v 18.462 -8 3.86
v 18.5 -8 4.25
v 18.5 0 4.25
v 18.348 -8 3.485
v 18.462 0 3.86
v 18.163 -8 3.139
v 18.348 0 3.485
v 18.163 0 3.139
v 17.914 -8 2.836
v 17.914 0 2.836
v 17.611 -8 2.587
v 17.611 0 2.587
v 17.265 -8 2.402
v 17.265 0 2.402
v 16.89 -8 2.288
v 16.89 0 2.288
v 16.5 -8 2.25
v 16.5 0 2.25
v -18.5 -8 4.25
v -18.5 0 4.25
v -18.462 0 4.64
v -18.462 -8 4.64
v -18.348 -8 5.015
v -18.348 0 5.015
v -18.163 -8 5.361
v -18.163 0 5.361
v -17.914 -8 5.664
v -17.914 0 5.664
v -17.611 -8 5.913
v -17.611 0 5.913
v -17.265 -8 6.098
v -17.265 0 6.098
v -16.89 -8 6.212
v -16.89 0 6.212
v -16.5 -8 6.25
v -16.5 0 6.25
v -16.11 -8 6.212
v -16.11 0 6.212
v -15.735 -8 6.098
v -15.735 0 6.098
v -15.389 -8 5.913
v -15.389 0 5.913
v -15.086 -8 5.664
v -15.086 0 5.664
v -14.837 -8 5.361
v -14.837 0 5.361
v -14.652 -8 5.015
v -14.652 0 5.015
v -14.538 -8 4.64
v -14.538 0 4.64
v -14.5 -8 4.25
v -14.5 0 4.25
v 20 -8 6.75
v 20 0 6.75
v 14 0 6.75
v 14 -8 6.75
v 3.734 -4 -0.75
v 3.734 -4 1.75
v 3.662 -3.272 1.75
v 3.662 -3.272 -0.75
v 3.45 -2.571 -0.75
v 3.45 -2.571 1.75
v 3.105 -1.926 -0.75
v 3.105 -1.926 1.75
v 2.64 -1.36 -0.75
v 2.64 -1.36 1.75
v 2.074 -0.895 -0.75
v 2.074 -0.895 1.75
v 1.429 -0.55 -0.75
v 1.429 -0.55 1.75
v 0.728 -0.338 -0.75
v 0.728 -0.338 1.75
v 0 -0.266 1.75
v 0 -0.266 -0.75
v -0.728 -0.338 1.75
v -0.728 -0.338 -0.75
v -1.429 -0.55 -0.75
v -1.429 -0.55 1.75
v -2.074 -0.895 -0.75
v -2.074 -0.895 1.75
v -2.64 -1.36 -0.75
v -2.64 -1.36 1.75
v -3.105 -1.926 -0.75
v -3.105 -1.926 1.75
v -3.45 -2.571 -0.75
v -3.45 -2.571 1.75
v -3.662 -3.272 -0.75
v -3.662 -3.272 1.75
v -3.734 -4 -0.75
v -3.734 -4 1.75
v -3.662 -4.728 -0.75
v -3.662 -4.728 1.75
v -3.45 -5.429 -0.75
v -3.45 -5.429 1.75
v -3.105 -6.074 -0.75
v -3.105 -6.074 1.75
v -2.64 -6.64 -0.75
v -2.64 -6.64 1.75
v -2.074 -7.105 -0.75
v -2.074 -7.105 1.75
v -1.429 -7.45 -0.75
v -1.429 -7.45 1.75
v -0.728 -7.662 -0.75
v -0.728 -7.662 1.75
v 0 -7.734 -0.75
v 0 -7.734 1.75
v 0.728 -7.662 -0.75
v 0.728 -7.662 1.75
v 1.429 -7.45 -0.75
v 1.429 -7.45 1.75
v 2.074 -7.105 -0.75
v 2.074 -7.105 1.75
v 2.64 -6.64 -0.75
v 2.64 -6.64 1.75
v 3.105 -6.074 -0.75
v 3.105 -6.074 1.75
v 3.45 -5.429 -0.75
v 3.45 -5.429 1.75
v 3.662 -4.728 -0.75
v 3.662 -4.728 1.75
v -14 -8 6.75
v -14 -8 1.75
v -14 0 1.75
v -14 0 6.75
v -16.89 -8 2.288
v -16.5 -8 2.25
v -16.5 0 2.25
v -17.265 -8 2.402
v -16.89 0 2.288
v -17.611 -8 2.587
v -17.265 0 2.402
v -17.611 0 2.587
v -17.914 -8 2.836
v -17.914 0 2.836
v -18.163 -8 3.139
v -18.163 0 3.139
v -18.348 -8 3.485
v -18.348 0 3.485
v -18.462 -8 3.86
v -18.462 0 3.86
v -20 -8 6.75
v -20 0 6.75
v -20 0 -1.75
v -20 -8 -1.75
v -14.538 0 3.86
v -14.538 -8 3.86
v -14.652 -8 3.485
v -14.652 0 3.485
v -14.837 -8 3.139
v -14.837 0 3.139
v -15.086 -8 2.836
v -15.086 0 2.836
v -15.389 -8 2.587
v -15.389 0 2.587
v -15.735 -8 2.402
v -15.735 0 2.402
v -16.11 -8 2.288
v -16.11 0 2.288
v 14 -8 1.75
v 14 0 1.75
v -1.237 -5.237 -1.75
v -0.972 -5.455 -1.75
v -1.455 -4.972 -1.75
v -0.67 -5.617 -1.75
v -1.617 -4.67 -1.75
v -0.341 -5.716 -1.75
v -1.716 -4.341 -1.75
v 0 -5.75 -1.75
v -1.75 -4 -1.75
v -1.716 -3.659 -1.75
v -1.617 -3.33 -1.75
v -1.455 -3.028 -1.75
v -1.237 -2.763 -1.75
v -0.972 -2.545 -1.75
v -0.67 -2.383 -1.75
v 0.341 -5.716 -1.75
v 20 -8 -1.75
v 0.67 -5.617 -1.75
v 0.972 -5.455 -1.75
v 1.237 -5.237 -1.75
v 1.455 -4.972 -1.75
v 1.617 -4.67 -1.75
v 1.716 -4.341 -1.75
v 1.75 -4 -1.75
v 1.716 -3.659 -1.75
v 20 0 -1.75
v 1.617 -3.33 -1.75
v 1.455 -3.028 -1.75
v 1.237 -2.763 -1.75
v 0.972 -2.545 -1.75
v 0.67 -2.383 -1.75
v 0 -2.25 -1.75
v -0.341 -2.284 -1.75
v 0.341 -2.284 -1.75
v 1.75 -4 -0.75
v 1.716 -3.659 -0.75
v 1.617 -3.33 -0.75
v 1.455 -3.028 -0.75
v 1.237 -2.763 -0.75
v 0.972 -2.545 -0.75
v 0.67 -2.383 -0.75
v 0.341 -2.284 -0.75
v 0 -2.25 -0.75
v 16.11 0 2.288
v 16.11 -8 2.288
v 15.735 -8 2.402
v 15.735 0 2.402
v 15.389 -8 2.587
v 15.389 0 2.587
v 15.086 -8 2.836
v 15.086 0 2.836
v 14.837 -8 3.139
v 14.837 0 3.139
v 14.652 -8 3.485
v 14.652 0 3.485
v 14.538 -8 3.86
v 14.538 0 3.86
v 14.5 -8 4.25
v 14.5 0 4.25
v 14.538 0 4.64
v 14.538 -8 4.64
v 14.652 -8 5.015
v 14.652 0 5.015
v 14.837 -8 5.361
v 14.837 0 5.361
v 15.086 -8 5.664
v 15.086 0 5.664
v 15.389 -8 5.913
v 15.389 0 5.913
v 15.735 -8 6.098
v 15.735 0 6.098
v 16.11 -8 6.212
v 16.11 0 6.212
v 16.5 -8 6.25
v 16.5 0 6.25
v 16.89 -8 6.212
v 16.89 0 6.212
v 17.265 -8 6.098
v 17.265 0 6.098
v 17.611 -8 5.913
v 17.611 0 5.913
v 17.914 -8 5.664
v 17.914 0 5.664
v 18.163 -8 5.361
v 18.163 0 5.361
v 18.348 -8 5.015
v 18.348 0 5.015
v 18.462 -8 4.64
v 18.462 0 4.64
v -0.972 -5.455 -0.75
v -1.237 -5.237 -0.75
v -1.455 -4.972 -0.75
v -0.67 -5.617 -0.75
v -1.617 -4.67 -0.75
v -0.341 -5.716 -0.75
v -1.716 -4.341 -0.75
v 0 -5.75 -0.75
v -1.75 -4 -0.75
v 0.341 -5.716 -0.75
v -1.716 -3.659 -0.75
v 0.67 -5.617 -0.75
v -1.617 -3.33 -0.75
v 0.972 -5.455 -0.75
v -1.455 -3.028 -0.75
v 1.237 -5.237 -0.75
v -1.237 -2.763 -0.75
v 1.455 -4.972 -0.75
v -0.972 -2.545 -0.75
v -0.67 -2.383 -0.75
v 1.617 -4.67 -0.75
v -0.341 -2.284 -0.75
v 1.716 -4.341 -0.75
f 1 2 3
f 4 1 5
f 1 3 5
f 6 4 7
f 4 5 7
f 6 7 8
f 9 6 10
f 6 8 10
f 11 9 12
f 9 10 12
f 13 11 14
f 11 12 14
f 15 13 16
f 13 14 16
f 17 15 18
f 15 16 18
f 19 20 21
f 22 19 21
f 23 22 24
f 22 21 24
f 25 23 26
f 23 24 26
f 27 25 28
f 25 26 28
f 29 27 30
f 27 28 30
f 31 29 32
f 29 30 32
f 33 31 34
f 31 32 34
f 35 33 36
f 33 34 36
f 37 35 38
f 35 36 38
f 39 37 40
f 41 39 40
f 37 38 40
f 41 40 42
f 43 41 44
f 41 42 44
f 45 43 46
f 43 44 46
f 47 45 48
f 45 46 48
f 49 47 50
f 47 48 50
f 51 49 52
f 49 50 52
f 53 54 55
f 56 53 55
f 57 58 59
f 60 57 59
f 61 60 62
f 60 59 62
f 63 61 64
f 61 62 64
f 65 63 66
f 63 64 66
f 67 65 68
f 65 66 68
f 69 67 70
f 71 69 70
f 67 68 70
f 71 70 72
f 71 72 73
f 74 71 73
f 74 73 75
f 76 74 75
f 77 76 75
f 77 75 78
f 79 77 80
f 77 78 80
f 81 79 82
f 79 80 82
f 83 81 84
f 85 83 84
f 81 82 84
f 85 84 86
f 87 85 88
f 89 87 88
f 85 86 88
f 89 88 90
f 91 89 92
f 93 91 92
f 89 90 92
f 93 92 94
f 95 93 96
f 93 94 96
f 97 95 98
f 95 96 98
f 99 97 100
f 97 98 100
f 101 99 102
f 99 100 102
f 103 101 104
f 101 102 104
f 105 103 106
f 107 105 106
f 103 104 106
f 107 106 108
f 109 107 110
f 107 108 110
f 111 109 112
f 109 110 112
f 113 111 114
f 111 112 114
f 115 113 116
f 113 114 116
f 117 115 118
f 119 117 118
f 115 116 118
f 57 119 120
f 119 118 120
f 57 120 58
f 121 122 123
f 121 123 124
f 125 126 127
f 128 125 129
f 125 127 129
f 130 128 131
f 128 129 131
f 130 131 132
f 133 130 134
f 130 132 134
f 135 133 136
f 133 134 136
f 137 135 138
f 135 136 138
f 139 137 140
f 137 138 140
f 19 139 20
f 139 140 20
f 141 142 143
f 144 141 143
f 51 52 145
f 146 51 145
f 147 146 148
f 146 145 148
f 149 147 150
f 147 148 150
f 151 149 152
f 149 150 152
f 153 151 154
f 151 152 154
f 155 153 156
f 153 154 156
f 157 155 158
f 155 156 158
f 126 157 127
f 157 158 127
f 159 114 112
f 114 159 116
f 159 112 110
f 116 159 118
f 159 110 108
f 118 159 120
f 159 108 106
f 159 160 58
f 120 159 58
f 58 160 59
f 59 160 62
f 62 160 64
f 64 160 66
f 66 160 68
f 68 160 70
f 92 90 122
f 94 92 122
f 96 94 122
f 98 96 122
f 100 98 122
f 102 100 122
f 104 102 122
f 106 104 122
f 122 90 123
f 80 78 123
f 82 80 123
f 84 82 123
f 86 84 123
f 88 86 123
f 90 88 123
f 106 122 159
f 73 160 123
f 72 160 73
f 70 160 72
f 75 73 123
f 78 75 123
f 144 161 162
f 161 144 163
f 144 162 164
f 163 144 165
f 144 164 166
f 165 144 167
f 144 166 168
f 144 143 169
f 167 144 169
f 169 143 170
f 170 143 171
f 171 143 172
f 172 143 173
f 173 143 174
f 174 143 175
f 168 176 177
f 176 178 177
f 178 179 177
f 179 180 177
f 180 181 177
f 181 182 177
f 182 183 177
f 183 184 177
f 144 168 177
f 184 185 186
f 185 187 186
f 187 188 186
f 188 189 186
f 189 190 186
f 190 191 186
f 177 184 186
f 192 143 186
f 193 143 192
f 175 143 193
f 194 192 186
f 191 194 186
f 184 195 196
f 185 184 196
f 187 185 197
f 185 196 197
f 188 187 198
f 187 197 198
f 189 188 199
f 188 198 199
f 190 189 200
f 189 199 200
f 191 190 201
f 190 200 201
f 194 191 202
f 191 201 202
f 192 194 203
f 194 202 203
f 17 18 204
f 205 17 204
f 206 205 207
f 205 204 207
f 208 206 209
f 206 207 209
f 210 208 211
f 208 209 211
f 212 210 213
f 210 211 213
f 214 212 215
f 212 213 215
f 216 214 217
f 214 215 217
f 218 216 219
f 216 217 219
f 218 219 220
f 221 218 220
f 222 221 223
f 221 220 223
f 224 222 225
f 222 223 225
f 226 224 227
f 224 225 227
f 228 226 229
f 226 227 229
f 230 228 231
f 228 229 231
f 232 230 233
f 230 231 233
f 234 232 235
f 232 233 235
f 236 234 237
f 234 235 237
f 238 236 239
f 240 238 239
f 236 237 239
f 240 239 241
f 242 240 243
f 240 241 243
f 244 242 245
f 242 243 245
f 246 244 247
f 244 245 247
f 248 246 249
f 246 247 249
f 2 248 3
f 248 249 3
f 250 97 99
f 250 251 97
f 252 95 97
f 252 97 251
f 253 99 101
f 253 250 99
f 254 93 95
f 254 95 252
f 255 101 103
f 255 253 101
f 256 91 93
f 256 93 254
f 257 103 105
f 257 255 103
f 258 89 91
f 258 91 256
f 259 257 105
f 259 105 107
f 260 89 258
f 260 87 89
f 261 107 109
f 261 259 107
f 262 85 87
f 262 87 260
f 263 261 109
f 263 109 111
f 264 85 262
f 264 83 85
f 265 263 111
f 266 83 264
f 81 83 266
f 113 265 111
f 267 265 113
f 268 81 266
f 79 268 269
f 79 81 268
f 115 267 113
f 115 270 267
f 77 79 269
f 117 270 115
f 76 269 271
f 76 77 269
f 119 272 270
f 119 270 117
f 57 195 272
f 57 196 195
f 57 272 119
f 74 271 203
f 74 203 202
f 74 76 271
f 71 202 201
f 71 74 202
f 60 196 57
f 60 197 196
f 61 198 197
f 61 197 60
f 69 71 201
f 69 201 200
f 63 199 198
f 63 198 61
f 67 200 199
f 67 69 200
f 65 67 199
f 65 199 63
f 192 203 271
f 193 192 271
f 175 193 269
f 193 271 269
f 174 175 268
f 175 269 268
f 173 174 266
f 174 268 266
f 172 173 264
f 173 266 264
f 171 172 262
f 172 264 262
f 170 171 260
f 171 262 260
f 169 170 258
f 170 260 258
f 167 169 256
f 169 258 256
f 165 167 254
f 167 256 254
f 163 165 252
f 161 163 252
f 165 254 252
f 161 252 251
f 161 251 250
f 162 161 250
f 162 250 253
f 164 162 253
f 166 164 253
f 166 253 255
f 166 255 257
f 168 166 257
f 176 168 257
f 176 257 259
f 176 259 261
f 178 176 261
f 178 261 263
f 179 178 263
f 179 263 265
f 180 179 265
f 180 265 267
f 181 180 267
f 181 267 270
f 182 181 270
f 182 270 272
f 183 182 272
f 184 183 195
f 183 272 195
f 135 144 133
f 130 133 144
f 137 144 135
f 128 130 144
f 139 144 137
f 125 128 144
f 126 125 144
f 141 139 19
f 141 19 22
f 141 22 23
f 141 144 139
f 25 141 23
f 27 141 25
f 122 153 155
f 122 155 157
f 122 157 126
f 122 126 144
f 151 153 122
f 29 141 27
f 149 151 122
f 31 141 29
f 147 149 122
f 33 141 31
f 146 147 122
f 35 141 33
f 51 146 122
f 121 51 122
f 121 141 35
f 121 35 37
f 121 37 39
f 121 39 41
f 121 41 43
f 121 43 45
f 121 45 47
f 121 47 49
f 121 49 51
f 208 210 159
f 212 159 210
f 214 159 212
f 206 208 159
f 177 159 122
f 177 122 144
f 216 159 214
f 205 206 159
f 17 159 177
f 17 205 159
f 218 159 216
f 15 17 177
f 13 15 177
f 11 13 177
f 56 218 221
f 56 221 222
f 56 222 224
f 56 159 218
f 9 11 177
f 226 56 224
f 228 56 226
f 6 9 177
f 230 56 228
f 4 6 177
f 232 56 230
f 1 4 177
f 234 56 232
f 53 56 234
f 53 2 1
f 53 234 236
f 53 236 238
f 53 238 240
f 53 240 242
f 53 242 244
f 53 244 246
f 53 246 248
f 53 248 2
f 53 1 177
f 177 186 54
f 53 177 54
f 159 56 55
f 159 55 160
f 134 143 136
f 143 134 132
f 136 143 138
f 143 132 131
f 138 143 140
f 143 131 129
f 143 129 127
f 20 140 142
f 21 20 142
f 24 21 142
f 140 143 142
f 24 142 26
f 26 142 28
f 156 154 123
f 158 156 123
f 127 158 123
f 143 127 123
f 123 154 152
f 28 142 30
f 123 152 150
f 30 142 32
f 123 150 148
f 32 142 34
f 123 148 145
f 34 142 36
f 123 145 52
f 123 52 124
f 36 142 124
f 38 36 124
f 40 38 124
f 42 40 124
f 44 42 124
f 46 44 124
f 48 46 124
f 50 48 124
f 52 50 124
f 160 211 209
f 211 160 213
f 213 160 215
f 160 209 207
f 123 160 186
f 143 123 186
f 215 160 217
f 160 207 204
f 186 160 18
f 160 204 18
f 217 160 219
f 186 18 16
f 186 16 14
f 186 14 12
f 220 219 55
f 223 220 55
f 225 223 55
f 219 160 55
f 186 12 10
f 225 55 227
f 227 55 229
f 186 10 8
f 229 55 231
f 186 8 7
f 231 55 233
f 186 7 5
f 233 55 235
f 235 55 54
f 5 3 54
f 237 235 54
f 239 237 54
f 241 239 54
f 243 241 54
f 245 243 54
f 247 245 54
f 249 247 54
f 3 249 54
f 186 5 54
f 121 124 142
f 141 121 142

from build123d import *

# Parameters (mm, degrees)
F1_DEPTH = 8
F3_DEPTH = 25
F4_R     = 3.733765
F5_DEPTH = 2.5


with BuildPart() as f1:
    # F0 (on Front) → F1 (new body)
    with BuildSketch(Plane.XZ):
        Polygon((16.5, 1.75), (14, 1.75), (-14, 1.75), (-16.5, 1.75), (-16.5, 0), (0, 0), (16.5, 0), align=None)
        with BuildLine():
            Line((14, 4.25), (14, 1.75))
            Line((14, 1.75), (16.5, 1.75))
            Line((16.5, 1.75), (16.5, 2.25))
            ThreePointArc((16.5, 2.25), (15.085786, 2.835786), (14.5, 4.25))
            Line((14.5, 4.25), (14, 4.25))
        make_face()
        with BuildLine():
            Line((-16.5, 1.75), (-14, 1.75))
            Line((-14, 1.75), (-14, 4.25))
            Line((-14, 4.25), (-14.5, 4.25))
            ThreePointArc((-14.5, 4.25), (-15.085786, 2.835786), (-16.5, 2.25))
            Line((-16.5, 2.25), (-16.5, 1.75))
        make_face()
        with BuildLine():
            Line((16.5, 2.25), (16.5, 1.75))
            Line((16.5, 1.75), (20, 1.75))
            Line((20, 1.75), (20, 4.25))
            Line((20, 4.25), (18.5, 4.25))
            ThreePointArc((18.5, 4.25), (17.914214, 2.835786), (16.5, 2.25))
        make_face()
        Polygon((20, 1.75), (16.5, 1.75), (16.5, 0), (0, 0), (-16.5, 0), (-16.5, 1.75), (-20, 1.75), (-20, -1.75), (20, -1.75), align=None)
        with BuildLine():
            Line((14, 6.75), (14, 4.25))
            Line((14, 4.25), (14.5, 4.25))
            ThreePointArc((14.5, 4.25), (16.5, 6.25), (18.5, 4.25))
            Line((18.5, 4.25), (20, 4.25))
            Line((20, 4.25), (20, 6.75))
            Line((20, 6.75), (14, 6.75))
        make_face()
        with BuildLine():
            Line((-20, 1.75), (-16.5, 1.75))
            Line((-16.5, 1.75), (-16.5, 2.25))
            ThreePointArc((-16.5, 2.25), (-17.914214, 2.835786), (-18.5, 4.25))
            Line((-18.5, 4.25), (-20, 4.25))
            Line((-20, 4.25), (-20, 1.75))
        make_face()
        with BuildLine():
            Line((-14.5, 4.25), (-14, 4.25))
            Line((-14, 4.25), (-14, 6.75))
            Line((-14, 6.75), (-20, 6.75))
            Line((-20, 6.75), (-20, 4.25))
            Line((-20, 4.25), (-18.5, 4.25))
            ThreePointArc((-18.5, 4.25), (-16.5, 6.25), (-14.5, 4.25))
        make_face()
    extrude(amount=F1_DEPTH)

    # F2 (on face) → F3 (cut)
    with BuildSketch(Plane.XY.offset(1.75)):
        with BuildLine():
            ThreePointArc((1.75, -4), (1.237437, -2.762563), (0, -2.25))
            ThreePointArc((0, -2.25), (-1.237437, -5.237437), (1.75, -4))
        make_face()
    extrude(amount=-F3_DEPTH, mode=Mode.SUBTRACT)

    # F4 (on face) → F5 (cut)
    with BuildSketch(Plane.XY.offset(1.75)):
        with Locations((0, -4)):
            Circle(F4_R)
    extrude(amount=-F5_DEPTH, mode=Mode.SUBTRACT)


solid = f1.part
